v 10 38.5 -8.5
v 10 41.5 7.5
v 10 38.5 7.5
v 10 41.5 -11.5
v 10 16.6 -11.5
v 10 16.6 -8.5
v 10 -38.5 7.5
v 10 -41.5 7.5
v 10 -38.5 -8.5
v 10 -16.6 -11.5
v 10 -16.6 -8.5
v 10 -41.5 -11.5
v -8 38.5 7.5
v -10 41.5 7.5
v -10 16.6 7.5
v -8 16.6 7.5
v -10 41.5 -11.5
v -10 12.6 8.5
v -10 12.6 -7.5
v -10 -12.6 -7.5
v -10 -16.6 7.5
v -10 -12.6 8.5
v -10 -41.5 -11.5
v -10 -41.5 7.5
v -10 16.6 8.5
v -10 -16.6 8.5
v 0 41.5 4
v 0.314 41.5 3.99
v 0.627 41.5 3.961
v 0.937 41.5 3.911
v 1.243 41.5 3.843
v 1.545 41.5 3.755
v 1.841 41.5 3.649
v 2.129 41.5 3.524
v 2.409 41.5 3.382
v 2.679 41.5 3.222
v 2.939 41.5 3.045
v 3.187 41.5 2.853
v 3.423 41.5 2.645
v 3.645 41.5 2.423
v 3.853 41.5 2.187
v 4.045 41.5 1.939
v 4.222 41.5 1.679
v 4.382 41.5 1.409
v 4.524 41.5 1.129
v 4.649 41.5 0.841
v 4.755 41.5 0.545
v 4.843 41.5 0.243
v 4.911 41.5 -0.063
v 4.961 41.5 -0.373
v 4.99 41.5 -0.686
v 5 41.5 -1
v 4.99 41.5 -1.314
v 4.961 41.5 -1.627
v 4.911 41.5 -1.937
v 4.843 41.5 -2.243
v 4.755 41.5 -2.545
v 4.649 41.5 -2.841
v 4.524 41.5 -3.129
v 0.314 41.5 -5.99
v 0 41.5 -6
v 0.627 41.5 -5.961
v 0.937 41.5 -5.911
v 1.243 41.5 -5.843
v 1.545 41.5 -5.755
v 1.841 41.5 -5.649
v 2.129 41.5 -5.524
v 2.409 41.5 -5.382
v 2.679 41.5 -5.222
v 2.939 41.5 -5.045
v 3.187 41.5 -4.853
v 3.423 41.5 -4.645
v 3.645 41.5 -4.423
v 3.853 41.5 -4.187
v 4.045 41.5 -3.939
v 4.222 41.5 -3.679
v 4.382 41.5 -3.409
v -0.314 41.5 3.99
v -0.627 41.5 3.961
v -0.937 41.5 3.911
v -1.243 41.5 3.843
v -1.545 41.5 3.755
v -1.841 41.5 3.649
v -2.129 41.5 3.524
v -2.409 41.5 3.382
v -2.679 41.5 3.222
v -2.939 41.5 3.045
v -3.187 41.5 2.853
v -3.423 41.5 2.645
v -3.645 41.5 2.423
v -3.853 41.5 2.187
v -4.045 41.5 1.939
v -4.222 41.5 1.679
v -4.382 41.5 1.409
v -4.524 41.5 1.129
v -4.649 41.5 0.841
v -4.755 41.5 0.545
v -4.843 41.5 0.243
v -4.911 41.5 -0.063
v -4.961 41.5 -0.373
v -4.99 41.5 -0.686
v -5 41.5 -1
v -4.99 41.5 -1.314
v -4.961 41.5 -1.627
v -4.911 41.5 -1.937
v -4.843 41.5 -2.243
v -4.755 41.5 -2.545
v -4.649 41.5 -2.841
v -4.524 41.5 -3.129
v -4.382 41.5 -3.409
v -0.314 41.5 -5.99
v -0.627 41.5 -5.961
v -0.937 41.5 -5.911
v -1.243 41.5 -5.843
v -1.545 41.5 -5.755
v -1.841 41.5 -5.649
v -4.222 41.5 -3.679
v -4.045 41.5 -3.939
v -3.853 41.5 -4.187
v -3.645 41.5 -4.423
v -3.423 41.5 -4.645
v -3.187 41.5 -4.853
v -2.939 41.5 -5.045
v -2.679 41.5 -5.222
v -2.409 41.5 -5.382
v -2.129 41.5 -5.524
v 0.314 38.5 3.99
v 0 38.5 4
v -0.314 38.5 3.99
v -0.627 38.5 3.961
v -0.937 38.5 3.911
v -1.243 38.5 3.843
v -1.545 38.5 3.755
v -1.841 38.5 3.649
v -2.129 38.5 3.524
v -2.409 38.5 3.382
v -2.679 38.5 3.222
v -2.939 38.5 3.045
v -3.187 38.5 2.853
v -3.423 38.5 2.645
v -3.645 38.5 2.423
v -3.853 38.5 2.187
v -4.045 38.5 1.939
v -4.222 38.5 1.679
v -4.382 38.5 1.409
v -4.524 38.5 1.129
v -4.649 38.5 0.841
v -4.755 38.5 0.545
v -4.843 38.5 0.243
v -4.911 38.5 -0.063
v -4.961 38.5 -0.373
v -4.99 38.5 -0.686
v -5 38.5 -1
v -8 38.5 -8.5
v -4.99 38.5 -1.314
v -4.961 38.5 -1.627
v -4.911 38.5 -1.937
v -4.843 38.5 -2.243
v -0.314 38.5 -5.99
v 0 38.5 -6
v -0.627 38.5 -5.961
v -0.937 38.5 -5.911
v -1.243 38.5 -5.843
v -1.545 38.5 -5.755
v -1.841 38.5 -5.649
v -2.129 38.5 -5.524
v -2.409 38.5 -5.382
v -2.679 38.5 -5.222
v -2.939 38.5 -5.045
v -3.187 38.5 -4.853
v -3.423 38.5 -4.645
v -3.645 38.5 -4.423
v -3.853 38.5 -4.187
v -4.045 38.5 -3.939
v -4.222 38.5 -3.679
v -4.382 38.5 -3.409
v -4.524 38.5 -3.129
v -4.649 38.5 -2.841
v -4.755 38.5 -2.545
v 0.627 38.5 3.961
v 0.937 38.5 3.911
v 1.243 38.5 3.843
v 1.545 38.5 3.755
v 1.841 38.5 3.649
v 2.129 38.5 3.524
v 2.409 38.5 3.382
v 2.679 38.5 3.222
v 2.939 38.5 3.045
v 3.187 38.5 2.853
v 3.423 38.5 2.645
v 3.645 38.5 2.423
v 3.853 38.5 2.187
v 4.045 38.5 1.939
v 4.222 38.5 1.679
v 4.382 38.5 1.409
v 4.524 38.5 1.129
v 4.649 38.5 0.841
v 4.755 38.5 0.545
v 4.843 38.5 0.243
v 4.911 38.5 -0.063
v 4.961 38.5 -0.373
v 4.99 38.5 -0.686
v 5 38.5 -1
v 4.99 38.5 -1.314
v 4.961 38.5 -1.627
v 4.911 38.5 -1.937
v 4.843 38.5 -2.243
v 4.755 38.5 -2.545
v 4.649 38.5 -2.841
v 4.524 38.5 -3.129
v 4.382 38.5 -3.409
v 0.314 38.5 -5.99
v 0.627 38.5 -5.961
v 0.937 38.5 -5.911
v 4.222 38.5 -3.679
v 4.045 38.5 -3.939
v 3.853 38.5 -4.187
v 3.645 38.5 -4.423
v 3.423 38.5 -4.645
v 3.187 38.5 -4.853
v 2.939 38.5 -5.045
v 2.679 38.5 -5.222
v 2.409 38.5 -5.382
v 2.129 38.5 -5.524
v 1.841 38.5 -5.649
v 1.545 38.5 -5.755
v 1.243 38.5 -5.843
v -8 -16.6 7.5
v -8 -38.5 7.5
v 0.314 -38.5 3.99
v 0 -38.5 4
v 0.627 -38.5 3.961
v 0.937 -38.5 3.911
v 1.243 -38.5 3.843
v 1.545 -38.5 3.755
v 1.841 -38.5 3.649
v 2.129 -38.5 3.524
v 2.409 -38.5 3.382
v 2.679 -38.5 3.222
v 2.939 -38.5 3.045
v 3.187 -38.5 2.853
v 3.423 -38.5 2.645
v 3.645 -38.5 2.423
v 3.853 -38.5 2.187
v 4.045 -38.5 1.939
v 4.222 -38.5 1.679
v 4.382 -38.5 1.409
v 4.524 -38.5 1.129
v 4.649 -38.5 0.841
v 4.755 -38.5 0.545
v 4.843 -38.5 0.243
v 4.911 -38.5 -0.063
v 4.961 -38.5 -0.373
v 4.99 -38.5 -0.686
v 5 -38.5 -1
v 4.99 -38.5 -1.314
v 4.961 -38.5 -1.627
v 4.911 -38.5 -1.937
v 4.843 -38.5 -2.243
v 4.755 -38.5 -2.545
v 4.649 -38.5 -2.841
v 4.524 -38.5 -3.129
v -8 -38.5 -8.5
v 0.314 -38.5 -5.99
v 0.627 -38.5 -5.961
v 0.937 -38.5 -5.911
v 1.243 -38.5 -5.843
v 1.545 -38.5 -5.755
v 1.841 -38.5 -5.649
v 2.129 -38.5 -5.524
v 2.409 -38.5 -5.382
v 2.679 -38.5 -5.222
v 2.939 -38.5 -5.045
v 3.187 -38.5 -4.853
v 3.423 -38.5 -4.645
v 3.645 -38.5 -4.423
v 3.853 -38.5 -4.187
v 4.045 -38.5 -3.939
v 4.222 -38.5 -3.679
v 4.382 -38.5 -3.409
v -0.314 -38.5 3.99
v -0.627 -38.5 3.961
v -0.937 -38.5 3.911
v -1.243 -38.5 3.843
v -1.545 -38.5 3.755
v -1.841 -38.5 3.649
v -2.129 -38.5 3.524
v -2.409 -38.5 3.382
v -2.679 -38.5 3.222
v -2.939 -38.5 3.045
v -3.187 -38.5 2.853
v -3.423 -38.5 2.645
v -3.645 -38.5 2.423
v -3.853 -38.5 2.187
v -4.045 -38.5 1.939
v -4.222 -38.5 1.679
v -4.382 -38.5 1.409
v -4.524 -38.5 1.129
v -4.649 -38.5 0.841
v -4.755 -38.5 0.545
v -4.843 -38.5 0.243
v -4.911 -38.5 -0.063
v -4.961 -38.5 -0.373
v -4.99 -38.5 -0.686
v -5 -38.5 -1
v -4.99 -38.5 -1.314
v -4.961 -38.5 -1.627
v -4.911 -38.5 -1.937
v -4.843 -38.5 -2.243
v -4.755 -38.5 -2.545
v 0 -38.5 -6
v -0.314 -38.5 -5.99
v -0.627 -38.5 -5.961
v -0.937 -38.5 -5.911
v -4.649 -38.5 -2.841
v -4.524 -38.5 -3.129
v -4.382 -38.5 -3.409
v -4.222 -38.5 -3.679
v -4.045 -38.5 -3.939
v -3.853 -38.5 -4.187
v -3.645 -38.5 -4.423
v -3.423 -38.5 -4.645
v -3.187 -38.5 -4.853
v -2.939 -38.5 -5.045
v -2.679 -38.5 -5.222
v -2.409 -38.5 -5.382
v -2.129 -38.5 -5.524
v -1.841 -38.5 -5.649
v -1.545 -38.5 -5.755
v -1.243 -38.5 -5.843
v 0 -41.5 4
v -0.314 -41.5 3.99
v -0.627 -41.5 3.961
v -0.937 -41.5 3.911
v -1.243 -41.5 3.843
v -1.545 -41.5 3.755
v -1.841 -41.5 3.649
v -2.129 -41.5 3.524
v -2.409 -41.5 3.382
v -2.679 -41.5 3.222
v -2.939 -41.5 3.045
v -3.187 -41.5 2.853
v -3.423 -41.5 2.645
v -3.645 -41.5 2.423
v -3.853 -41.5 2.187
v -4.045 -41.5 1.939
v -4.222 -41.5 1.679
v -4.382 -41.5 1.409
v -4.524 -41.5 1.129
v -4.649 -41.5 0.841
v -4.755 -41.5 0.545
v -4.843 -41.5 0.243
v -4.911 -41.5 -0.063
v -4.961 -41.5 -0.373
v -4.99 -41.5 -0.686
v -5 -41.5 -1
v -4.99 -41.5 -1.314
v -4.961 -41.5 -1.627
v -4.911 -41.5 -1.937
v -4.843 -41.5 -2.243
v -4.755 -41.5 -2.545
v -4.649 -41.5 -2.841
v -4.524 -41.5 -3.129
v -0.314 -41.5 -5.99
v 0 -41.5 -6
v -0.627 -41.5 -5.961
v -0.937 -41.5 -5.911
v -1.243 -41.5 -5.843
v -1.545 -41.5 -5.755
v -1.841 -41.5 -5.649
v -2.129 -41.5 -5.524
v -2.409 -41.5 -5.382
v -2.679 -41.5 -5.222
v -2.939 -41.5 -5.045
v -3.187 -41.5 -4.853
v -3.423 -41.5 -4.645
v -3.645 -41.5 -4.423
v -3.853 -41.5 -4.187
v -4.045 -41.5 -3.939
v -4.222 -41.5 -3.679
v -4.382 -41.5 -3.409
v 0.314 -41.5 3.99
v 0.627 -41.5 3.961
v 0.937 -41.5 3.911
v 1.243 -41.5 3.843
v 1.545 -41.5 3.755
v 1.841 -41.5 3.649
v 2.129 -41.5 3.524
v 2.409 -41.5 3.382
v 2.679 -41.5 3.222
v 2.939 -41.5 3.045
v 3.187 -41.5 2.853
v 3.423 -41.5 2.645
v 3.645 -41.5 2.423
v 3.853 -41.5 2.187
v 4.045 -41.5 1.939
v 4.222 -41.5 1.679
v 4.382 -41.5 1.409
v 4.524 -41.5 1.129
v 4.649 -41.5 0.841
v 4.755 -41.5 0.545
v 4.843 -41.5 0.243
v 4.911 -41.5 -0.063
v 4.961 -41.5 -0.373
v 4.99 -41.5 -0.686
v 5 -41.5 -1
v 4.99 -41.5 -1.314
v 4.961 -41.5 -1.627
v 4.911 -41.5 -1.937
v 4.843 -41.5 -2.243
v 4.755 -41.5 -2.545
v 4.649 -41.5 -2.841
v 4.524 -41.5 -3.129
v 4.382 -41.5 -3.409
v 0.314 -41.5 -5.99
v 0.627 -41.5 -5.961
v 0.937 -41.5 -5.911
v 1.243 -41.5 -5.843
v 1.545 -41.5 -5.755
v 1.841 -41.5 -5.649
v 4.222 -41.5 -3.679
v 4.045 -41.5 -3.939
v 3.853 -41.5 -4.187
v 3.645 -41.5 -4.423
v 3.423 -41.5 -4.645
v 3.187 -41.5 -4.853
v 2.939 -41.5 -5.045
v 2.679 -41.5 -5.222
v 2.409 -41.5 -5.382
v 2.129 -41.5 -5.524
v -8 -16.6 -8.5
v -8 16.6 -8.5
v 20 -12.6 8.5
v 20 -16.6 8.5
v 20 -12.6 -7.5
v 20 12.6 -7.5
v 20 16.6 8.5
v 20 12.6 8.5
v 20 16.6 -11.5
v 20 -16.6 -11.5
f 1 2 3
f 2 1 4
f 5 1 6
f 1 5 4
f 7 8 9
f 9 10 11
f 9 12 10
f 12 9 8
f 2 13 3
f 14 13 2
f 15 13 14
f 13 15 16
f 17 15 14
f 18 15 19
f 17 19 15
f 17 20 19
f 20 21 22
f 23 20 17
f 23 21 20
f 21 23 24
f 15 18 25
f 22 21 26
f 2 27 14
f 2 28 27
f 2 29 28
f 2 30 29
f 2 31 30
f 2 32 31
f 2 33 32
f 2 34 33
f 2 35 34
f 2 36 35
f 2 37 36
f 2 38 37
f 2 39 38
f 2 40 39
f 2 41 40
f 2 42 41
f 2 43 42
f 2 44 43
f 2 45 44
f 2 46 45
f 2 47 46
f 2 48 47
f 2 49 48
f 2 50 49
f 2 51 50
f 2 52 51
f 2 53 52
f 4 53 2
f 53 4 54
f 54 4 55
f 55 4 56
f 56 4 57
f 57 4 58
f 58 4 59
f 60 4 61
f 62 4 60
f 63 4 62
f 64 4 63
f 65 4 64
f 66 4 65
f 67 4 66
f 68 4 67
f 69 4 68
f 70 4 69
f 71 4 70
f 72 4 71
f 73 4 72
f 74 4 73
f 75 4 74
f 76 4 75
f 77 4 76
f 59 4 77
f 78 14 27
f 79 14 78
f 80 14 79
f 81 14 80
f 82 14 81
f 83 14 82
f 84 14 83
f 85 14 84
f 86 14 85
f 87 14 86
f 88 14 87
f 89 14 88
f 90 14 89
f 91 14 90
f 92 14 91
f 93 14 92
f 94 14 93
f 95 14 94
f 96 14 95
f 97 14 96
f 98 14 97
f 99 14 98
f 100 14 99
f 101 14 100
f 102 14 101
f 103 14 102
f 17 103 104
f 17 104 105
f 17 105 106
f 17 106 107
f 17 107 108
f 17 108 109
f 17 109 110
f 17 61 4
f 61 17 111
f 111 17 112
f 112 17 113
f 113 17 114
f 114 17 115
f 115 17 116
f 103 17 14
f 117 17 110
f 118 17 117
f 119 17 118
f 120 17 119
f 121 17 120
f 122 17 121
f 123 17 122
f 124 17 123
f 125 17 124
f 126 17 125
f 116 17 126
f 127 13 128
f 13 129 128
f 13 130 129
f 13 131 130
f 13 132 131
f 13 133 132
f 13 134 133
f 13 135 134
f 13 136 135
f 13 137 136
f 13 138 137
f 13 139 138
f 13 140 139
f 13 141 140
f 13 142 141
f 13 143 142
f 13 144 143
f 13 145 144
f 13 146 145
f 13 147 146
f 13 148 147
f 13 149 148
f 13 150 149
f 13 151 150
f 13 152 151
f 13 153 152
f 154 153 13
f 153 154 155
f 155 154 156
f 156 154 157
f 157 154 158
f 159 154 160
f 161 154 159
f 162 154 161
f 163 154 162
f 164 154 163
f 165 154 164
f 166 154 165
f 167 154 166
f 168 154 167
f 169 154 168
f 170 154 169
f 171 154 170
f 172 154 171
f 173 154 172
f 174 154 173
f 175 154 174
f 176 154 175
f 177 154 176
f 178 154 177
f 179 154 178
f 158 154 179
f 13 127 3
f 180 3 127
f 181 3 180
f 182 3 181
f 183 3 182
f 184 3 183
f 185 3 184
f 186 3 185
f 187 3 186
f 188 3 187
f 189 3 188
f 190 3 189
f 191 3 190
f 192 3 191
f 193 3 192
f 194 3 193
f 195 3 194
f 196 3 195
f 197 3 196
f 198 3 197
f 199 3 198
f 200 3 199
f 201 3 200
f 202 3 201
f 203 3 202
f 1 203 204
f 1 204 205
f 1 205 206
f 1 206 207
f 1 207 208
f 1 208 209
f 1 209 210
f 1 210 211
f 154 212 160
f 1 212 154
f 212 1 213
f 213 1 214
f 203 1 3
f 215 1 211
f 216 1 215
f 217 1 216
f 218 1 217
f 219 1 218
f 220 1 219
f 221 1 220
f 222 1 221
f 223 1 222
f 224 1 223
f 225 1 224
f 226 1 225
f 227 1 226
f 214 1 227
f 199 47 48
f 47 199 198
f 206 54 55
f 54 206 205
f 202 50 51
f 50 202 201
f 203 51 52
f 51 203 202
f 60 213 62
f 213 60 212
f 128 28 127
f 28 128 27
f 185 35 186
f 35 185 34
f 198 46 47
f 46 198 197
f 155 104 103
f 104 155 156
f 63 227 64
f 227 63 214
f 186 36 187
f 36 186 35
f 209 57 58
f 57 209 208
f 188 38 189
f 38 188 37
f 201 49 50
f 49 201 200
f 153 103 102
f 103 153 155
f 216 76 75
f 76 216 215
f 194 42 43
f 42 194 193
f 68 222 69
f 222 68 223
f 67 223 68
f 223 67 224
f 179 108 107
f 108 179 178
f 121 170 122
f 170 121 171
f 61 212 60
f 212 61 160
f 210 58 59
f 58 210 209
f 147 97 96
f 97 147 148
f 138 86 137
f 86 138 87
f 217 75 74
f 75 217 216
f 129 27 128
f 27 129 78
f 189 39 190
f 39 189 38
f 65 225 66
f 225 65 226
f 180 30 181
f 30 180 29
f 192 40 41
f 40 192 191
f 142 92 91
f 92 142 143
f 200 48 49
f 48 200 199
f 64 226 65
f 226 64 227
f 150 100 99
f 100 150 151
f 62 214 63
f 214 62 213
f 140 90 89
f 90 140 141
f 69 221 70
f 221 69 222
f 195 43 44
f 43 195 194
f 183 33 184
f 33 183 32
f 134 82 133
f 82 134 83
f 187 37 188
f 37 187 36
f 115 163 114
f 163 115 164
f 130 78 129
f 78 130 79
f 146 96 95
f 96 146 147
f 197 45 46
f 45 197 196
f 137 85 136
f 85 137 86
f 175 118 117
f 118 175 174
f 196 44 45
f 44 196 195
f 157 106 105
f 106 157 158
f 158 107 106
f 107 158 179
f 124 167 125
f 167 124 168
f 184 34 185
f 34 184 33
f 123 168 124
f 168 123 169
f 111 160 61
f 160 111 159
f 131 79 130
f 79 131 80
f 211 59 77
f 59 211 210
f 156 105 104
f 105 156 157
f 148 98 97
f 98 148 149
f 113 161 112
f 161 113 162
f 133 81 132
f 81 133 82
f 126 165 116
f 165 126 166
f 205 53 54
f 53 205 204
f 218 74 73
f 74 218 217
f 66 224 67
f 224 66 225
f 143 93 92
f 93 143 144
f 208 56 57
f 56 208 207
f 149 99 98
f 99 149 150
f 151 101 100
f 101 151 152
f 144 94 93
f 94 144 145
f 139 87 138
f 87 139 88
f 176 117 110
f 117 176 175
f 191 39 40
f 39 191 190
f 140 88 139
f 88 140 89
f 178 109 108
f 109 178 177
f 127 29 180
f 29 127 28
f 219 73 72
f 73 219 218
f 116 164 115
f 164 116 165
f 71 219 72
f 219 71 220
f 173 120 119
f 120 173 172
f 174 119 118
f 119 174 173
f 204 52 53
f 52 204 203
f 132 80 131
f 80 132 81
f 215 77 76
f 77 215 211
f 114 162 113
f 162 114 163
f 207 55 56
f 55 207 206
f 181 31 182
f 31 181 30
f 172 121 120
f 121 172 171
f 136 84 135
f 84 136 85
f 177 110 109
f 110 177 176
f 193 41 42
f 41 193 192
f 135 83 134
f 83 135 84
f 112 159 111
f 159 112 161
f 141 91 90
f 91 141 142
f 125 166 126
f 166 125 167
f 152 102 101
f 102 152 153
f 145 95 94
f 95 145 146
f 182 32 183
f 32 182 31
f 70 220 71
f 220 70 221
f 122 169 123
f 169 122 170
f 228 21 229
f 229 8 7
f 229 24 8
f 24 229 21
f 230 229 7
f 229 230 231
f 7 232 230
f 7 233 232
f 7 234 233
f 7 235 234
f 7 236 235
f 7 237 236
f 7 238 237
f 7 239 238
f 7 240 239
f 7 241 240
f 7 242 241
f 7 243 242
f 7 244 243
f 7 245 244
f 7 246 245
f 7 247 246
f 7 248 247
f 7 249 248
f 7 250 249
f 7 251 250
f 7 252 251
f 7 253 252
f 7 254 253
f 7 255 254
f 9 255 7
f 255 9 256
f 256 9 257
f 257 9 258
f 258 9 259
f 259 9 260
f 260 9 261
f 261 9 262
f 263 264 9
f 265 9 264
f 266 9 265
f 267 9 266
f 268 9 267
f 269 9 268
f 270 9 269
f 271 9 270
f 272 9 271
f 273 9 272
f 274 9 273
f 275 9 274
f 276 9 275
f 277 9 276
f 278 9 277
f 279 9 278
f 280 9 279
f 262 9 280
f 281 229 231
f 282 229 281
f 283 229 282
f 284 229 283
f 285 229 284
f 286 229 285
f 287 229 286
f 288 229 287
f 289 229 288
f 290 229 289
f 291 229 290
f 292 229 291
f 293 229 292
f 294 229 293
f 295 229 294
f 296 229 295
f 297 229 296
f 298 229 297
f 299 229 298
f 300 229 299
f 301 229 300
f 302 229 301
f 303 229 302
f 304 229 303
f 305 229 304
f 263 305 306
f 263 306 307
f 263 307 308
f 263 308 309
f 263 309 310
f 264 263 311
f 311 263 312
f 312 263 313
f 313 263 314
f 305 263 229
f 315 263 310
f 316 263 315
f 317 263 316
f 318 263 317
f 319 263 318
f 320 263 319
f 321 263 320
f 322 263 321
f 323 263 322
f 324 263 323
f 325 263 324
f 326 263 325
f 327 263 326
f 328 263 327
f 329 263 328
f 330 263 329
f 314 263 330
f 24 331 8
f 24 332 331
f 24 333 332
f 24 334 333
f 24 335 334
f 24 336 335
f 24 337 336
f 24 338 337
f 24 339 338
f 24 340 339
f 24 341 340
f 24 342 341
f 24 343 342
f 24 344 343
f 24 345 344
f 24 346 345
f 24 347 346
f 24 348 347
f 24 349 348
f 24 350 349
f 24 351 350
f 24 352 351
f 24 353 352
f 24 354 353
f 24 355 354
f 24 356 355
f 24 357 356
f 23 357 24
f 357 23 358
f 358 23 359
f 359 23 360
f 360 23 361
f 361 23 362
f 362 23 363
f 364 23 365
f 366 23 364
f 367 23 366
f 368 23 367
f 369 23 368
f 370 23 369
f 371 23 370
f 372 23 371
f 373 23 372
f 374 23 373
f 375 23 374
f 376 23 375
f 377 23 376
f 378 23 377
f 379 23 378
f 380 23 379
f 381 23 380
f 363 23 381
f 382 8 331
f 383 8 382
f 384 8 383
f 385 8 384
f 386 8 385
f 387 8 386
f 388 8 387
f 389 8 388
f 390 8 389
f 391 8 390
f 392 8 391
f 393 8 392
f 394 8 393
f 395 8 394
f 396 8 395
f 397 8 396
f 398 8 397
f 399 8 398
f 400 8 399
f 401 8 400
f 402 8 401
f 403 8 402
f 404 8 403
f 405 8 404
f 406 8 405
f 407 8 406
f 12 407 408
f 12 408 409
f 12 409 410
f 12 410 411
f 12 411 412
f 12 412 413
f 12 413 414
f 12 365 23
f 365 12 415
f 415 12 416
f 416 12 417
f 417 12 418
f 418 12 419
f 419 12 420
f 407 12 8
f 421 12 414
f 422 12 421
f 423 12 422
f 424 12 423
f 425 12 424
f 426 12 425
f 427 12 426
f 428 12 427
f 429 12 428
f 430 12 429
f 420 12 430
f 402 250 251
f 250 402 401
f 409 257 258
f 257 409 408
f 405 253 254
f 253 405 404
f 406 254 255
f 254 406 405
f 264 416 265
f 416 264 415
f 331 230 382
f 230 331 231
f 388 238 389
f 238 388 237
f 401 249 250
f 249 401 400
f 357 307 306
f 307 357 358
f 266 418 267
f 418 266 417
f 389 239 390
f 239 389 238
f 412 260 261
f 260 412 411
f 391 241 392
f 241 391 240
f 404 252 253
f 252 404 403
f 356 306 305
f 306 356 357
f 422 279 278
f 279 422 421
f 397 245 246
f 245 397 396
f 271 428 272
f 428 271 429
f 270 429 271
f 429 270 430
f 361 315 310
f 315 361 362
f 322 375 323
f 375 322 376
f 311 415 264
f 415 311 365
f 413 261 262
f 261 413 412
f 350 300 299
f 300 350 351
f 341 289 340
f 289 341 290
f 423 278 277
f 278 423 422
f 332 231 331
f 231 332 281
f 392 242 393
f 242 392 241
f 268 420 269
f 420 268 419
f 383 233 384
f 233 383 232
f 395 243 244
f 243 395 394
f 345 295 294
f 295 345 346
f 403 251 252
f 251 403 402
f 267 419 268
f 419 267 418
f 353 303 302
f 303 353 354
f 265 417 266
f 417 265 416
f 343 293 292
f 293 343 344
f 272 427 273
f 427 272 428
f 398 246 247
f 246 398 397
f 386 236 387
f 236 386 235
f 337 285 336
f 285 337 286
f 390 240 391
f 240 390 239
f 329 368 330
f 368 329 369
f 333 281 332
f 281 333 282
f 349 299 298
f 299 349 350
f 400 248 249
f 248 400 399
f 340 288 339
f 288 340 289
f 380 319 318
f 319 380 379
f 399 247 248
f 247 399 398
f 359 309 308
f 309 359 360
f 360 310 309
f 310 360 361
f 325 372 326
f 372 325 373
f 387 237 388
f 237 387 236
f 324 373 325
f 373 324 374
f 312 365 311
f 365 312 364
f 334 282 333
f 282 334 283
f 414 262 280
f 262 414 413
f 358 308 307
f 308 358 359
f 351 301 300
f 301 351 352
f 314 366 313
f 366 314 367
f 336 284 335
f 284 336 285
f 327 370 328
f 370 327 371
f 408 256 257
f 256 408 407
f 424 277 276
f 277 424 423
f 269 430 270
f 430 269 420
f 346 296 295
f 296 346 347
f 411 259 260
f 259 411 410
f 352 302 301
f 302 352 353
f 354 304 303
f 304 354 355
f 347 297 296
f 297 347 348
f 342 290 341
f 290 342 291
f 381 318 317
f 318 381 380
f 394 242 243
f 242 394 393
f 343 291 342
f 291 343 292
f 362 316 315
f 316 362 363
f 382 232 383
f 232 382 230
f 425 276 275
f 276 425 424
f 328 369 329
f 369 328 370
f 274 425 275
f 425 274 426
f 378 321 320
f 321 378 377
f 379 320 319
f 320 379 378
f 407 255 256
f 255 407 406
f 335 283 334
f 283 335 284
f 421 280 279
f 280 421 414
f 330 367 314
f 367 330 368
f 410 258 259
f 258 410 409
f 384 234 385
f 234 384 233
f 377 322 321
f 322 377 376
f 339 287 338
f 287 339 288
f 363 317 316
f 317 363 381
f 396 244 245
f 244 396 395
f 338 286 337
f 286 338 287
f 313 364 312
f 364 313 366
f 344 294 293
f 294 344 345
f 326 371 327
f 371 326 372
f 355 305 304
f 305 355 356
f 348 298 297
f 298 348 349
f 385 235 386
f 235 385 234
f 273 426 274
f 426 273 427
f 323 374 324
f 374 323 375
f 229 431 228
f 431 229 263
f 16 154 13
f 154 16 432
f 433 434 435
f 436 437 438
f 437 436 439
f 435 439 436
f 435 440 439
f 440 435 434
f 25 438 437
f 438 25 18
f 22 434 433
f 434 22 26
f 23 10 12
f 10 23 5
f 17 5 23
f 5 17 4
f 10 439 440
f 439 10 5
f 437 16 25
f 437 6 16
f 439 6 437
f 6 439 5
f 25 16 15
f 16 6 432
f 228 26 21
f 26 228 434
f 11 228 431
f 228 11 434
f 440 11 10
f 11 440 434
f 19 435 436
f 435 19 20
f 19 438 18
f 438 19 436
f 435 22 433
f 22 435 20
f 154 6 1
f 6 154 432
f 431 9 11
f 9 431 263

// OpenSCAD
$fn = 100;
larghezza = 80;
spessore = 3;
for (i = [larghezza/2,-larghezza/2]){
    translate([0,i,-1]){
        difference() {
            cube ([20,spessore,17],true);
                rotate([90,0,0]){
                    cylinder(5,5,5,true);
            }
        }
    }
}
translate([0,0,-10]){
    cube([20,larghezza+spessore,spessore],true);
}

for (i = [-larghezza/2+13,larghezza/2-13]){
    translate([-9,i,-1]){
        cube([2,25,17],true);
    }
}


module Aggancio(){
    lunghezza_blocco = 30;
    larghezza_tubo = 25.2;
    altezza_tubo = 16;
    spessore_frame = 4;

    difference(){
        translate([0,(-larghezza_tubo - spessore_frame*2)/2,0]){
            cube([lunghezza_blocco,larghezza_tubo + spessore_frame*2 ,altezza_tubo+spessore_frame]);
        }
        translate([0,-larghezza_tubo/2,spessore_frame]){
            cube([lunghezza_blocco,larghezza_tubo,altezza_tubo]);
        }
    }
}

translate([-10,0,-11.5]){
Aggancio();
}
